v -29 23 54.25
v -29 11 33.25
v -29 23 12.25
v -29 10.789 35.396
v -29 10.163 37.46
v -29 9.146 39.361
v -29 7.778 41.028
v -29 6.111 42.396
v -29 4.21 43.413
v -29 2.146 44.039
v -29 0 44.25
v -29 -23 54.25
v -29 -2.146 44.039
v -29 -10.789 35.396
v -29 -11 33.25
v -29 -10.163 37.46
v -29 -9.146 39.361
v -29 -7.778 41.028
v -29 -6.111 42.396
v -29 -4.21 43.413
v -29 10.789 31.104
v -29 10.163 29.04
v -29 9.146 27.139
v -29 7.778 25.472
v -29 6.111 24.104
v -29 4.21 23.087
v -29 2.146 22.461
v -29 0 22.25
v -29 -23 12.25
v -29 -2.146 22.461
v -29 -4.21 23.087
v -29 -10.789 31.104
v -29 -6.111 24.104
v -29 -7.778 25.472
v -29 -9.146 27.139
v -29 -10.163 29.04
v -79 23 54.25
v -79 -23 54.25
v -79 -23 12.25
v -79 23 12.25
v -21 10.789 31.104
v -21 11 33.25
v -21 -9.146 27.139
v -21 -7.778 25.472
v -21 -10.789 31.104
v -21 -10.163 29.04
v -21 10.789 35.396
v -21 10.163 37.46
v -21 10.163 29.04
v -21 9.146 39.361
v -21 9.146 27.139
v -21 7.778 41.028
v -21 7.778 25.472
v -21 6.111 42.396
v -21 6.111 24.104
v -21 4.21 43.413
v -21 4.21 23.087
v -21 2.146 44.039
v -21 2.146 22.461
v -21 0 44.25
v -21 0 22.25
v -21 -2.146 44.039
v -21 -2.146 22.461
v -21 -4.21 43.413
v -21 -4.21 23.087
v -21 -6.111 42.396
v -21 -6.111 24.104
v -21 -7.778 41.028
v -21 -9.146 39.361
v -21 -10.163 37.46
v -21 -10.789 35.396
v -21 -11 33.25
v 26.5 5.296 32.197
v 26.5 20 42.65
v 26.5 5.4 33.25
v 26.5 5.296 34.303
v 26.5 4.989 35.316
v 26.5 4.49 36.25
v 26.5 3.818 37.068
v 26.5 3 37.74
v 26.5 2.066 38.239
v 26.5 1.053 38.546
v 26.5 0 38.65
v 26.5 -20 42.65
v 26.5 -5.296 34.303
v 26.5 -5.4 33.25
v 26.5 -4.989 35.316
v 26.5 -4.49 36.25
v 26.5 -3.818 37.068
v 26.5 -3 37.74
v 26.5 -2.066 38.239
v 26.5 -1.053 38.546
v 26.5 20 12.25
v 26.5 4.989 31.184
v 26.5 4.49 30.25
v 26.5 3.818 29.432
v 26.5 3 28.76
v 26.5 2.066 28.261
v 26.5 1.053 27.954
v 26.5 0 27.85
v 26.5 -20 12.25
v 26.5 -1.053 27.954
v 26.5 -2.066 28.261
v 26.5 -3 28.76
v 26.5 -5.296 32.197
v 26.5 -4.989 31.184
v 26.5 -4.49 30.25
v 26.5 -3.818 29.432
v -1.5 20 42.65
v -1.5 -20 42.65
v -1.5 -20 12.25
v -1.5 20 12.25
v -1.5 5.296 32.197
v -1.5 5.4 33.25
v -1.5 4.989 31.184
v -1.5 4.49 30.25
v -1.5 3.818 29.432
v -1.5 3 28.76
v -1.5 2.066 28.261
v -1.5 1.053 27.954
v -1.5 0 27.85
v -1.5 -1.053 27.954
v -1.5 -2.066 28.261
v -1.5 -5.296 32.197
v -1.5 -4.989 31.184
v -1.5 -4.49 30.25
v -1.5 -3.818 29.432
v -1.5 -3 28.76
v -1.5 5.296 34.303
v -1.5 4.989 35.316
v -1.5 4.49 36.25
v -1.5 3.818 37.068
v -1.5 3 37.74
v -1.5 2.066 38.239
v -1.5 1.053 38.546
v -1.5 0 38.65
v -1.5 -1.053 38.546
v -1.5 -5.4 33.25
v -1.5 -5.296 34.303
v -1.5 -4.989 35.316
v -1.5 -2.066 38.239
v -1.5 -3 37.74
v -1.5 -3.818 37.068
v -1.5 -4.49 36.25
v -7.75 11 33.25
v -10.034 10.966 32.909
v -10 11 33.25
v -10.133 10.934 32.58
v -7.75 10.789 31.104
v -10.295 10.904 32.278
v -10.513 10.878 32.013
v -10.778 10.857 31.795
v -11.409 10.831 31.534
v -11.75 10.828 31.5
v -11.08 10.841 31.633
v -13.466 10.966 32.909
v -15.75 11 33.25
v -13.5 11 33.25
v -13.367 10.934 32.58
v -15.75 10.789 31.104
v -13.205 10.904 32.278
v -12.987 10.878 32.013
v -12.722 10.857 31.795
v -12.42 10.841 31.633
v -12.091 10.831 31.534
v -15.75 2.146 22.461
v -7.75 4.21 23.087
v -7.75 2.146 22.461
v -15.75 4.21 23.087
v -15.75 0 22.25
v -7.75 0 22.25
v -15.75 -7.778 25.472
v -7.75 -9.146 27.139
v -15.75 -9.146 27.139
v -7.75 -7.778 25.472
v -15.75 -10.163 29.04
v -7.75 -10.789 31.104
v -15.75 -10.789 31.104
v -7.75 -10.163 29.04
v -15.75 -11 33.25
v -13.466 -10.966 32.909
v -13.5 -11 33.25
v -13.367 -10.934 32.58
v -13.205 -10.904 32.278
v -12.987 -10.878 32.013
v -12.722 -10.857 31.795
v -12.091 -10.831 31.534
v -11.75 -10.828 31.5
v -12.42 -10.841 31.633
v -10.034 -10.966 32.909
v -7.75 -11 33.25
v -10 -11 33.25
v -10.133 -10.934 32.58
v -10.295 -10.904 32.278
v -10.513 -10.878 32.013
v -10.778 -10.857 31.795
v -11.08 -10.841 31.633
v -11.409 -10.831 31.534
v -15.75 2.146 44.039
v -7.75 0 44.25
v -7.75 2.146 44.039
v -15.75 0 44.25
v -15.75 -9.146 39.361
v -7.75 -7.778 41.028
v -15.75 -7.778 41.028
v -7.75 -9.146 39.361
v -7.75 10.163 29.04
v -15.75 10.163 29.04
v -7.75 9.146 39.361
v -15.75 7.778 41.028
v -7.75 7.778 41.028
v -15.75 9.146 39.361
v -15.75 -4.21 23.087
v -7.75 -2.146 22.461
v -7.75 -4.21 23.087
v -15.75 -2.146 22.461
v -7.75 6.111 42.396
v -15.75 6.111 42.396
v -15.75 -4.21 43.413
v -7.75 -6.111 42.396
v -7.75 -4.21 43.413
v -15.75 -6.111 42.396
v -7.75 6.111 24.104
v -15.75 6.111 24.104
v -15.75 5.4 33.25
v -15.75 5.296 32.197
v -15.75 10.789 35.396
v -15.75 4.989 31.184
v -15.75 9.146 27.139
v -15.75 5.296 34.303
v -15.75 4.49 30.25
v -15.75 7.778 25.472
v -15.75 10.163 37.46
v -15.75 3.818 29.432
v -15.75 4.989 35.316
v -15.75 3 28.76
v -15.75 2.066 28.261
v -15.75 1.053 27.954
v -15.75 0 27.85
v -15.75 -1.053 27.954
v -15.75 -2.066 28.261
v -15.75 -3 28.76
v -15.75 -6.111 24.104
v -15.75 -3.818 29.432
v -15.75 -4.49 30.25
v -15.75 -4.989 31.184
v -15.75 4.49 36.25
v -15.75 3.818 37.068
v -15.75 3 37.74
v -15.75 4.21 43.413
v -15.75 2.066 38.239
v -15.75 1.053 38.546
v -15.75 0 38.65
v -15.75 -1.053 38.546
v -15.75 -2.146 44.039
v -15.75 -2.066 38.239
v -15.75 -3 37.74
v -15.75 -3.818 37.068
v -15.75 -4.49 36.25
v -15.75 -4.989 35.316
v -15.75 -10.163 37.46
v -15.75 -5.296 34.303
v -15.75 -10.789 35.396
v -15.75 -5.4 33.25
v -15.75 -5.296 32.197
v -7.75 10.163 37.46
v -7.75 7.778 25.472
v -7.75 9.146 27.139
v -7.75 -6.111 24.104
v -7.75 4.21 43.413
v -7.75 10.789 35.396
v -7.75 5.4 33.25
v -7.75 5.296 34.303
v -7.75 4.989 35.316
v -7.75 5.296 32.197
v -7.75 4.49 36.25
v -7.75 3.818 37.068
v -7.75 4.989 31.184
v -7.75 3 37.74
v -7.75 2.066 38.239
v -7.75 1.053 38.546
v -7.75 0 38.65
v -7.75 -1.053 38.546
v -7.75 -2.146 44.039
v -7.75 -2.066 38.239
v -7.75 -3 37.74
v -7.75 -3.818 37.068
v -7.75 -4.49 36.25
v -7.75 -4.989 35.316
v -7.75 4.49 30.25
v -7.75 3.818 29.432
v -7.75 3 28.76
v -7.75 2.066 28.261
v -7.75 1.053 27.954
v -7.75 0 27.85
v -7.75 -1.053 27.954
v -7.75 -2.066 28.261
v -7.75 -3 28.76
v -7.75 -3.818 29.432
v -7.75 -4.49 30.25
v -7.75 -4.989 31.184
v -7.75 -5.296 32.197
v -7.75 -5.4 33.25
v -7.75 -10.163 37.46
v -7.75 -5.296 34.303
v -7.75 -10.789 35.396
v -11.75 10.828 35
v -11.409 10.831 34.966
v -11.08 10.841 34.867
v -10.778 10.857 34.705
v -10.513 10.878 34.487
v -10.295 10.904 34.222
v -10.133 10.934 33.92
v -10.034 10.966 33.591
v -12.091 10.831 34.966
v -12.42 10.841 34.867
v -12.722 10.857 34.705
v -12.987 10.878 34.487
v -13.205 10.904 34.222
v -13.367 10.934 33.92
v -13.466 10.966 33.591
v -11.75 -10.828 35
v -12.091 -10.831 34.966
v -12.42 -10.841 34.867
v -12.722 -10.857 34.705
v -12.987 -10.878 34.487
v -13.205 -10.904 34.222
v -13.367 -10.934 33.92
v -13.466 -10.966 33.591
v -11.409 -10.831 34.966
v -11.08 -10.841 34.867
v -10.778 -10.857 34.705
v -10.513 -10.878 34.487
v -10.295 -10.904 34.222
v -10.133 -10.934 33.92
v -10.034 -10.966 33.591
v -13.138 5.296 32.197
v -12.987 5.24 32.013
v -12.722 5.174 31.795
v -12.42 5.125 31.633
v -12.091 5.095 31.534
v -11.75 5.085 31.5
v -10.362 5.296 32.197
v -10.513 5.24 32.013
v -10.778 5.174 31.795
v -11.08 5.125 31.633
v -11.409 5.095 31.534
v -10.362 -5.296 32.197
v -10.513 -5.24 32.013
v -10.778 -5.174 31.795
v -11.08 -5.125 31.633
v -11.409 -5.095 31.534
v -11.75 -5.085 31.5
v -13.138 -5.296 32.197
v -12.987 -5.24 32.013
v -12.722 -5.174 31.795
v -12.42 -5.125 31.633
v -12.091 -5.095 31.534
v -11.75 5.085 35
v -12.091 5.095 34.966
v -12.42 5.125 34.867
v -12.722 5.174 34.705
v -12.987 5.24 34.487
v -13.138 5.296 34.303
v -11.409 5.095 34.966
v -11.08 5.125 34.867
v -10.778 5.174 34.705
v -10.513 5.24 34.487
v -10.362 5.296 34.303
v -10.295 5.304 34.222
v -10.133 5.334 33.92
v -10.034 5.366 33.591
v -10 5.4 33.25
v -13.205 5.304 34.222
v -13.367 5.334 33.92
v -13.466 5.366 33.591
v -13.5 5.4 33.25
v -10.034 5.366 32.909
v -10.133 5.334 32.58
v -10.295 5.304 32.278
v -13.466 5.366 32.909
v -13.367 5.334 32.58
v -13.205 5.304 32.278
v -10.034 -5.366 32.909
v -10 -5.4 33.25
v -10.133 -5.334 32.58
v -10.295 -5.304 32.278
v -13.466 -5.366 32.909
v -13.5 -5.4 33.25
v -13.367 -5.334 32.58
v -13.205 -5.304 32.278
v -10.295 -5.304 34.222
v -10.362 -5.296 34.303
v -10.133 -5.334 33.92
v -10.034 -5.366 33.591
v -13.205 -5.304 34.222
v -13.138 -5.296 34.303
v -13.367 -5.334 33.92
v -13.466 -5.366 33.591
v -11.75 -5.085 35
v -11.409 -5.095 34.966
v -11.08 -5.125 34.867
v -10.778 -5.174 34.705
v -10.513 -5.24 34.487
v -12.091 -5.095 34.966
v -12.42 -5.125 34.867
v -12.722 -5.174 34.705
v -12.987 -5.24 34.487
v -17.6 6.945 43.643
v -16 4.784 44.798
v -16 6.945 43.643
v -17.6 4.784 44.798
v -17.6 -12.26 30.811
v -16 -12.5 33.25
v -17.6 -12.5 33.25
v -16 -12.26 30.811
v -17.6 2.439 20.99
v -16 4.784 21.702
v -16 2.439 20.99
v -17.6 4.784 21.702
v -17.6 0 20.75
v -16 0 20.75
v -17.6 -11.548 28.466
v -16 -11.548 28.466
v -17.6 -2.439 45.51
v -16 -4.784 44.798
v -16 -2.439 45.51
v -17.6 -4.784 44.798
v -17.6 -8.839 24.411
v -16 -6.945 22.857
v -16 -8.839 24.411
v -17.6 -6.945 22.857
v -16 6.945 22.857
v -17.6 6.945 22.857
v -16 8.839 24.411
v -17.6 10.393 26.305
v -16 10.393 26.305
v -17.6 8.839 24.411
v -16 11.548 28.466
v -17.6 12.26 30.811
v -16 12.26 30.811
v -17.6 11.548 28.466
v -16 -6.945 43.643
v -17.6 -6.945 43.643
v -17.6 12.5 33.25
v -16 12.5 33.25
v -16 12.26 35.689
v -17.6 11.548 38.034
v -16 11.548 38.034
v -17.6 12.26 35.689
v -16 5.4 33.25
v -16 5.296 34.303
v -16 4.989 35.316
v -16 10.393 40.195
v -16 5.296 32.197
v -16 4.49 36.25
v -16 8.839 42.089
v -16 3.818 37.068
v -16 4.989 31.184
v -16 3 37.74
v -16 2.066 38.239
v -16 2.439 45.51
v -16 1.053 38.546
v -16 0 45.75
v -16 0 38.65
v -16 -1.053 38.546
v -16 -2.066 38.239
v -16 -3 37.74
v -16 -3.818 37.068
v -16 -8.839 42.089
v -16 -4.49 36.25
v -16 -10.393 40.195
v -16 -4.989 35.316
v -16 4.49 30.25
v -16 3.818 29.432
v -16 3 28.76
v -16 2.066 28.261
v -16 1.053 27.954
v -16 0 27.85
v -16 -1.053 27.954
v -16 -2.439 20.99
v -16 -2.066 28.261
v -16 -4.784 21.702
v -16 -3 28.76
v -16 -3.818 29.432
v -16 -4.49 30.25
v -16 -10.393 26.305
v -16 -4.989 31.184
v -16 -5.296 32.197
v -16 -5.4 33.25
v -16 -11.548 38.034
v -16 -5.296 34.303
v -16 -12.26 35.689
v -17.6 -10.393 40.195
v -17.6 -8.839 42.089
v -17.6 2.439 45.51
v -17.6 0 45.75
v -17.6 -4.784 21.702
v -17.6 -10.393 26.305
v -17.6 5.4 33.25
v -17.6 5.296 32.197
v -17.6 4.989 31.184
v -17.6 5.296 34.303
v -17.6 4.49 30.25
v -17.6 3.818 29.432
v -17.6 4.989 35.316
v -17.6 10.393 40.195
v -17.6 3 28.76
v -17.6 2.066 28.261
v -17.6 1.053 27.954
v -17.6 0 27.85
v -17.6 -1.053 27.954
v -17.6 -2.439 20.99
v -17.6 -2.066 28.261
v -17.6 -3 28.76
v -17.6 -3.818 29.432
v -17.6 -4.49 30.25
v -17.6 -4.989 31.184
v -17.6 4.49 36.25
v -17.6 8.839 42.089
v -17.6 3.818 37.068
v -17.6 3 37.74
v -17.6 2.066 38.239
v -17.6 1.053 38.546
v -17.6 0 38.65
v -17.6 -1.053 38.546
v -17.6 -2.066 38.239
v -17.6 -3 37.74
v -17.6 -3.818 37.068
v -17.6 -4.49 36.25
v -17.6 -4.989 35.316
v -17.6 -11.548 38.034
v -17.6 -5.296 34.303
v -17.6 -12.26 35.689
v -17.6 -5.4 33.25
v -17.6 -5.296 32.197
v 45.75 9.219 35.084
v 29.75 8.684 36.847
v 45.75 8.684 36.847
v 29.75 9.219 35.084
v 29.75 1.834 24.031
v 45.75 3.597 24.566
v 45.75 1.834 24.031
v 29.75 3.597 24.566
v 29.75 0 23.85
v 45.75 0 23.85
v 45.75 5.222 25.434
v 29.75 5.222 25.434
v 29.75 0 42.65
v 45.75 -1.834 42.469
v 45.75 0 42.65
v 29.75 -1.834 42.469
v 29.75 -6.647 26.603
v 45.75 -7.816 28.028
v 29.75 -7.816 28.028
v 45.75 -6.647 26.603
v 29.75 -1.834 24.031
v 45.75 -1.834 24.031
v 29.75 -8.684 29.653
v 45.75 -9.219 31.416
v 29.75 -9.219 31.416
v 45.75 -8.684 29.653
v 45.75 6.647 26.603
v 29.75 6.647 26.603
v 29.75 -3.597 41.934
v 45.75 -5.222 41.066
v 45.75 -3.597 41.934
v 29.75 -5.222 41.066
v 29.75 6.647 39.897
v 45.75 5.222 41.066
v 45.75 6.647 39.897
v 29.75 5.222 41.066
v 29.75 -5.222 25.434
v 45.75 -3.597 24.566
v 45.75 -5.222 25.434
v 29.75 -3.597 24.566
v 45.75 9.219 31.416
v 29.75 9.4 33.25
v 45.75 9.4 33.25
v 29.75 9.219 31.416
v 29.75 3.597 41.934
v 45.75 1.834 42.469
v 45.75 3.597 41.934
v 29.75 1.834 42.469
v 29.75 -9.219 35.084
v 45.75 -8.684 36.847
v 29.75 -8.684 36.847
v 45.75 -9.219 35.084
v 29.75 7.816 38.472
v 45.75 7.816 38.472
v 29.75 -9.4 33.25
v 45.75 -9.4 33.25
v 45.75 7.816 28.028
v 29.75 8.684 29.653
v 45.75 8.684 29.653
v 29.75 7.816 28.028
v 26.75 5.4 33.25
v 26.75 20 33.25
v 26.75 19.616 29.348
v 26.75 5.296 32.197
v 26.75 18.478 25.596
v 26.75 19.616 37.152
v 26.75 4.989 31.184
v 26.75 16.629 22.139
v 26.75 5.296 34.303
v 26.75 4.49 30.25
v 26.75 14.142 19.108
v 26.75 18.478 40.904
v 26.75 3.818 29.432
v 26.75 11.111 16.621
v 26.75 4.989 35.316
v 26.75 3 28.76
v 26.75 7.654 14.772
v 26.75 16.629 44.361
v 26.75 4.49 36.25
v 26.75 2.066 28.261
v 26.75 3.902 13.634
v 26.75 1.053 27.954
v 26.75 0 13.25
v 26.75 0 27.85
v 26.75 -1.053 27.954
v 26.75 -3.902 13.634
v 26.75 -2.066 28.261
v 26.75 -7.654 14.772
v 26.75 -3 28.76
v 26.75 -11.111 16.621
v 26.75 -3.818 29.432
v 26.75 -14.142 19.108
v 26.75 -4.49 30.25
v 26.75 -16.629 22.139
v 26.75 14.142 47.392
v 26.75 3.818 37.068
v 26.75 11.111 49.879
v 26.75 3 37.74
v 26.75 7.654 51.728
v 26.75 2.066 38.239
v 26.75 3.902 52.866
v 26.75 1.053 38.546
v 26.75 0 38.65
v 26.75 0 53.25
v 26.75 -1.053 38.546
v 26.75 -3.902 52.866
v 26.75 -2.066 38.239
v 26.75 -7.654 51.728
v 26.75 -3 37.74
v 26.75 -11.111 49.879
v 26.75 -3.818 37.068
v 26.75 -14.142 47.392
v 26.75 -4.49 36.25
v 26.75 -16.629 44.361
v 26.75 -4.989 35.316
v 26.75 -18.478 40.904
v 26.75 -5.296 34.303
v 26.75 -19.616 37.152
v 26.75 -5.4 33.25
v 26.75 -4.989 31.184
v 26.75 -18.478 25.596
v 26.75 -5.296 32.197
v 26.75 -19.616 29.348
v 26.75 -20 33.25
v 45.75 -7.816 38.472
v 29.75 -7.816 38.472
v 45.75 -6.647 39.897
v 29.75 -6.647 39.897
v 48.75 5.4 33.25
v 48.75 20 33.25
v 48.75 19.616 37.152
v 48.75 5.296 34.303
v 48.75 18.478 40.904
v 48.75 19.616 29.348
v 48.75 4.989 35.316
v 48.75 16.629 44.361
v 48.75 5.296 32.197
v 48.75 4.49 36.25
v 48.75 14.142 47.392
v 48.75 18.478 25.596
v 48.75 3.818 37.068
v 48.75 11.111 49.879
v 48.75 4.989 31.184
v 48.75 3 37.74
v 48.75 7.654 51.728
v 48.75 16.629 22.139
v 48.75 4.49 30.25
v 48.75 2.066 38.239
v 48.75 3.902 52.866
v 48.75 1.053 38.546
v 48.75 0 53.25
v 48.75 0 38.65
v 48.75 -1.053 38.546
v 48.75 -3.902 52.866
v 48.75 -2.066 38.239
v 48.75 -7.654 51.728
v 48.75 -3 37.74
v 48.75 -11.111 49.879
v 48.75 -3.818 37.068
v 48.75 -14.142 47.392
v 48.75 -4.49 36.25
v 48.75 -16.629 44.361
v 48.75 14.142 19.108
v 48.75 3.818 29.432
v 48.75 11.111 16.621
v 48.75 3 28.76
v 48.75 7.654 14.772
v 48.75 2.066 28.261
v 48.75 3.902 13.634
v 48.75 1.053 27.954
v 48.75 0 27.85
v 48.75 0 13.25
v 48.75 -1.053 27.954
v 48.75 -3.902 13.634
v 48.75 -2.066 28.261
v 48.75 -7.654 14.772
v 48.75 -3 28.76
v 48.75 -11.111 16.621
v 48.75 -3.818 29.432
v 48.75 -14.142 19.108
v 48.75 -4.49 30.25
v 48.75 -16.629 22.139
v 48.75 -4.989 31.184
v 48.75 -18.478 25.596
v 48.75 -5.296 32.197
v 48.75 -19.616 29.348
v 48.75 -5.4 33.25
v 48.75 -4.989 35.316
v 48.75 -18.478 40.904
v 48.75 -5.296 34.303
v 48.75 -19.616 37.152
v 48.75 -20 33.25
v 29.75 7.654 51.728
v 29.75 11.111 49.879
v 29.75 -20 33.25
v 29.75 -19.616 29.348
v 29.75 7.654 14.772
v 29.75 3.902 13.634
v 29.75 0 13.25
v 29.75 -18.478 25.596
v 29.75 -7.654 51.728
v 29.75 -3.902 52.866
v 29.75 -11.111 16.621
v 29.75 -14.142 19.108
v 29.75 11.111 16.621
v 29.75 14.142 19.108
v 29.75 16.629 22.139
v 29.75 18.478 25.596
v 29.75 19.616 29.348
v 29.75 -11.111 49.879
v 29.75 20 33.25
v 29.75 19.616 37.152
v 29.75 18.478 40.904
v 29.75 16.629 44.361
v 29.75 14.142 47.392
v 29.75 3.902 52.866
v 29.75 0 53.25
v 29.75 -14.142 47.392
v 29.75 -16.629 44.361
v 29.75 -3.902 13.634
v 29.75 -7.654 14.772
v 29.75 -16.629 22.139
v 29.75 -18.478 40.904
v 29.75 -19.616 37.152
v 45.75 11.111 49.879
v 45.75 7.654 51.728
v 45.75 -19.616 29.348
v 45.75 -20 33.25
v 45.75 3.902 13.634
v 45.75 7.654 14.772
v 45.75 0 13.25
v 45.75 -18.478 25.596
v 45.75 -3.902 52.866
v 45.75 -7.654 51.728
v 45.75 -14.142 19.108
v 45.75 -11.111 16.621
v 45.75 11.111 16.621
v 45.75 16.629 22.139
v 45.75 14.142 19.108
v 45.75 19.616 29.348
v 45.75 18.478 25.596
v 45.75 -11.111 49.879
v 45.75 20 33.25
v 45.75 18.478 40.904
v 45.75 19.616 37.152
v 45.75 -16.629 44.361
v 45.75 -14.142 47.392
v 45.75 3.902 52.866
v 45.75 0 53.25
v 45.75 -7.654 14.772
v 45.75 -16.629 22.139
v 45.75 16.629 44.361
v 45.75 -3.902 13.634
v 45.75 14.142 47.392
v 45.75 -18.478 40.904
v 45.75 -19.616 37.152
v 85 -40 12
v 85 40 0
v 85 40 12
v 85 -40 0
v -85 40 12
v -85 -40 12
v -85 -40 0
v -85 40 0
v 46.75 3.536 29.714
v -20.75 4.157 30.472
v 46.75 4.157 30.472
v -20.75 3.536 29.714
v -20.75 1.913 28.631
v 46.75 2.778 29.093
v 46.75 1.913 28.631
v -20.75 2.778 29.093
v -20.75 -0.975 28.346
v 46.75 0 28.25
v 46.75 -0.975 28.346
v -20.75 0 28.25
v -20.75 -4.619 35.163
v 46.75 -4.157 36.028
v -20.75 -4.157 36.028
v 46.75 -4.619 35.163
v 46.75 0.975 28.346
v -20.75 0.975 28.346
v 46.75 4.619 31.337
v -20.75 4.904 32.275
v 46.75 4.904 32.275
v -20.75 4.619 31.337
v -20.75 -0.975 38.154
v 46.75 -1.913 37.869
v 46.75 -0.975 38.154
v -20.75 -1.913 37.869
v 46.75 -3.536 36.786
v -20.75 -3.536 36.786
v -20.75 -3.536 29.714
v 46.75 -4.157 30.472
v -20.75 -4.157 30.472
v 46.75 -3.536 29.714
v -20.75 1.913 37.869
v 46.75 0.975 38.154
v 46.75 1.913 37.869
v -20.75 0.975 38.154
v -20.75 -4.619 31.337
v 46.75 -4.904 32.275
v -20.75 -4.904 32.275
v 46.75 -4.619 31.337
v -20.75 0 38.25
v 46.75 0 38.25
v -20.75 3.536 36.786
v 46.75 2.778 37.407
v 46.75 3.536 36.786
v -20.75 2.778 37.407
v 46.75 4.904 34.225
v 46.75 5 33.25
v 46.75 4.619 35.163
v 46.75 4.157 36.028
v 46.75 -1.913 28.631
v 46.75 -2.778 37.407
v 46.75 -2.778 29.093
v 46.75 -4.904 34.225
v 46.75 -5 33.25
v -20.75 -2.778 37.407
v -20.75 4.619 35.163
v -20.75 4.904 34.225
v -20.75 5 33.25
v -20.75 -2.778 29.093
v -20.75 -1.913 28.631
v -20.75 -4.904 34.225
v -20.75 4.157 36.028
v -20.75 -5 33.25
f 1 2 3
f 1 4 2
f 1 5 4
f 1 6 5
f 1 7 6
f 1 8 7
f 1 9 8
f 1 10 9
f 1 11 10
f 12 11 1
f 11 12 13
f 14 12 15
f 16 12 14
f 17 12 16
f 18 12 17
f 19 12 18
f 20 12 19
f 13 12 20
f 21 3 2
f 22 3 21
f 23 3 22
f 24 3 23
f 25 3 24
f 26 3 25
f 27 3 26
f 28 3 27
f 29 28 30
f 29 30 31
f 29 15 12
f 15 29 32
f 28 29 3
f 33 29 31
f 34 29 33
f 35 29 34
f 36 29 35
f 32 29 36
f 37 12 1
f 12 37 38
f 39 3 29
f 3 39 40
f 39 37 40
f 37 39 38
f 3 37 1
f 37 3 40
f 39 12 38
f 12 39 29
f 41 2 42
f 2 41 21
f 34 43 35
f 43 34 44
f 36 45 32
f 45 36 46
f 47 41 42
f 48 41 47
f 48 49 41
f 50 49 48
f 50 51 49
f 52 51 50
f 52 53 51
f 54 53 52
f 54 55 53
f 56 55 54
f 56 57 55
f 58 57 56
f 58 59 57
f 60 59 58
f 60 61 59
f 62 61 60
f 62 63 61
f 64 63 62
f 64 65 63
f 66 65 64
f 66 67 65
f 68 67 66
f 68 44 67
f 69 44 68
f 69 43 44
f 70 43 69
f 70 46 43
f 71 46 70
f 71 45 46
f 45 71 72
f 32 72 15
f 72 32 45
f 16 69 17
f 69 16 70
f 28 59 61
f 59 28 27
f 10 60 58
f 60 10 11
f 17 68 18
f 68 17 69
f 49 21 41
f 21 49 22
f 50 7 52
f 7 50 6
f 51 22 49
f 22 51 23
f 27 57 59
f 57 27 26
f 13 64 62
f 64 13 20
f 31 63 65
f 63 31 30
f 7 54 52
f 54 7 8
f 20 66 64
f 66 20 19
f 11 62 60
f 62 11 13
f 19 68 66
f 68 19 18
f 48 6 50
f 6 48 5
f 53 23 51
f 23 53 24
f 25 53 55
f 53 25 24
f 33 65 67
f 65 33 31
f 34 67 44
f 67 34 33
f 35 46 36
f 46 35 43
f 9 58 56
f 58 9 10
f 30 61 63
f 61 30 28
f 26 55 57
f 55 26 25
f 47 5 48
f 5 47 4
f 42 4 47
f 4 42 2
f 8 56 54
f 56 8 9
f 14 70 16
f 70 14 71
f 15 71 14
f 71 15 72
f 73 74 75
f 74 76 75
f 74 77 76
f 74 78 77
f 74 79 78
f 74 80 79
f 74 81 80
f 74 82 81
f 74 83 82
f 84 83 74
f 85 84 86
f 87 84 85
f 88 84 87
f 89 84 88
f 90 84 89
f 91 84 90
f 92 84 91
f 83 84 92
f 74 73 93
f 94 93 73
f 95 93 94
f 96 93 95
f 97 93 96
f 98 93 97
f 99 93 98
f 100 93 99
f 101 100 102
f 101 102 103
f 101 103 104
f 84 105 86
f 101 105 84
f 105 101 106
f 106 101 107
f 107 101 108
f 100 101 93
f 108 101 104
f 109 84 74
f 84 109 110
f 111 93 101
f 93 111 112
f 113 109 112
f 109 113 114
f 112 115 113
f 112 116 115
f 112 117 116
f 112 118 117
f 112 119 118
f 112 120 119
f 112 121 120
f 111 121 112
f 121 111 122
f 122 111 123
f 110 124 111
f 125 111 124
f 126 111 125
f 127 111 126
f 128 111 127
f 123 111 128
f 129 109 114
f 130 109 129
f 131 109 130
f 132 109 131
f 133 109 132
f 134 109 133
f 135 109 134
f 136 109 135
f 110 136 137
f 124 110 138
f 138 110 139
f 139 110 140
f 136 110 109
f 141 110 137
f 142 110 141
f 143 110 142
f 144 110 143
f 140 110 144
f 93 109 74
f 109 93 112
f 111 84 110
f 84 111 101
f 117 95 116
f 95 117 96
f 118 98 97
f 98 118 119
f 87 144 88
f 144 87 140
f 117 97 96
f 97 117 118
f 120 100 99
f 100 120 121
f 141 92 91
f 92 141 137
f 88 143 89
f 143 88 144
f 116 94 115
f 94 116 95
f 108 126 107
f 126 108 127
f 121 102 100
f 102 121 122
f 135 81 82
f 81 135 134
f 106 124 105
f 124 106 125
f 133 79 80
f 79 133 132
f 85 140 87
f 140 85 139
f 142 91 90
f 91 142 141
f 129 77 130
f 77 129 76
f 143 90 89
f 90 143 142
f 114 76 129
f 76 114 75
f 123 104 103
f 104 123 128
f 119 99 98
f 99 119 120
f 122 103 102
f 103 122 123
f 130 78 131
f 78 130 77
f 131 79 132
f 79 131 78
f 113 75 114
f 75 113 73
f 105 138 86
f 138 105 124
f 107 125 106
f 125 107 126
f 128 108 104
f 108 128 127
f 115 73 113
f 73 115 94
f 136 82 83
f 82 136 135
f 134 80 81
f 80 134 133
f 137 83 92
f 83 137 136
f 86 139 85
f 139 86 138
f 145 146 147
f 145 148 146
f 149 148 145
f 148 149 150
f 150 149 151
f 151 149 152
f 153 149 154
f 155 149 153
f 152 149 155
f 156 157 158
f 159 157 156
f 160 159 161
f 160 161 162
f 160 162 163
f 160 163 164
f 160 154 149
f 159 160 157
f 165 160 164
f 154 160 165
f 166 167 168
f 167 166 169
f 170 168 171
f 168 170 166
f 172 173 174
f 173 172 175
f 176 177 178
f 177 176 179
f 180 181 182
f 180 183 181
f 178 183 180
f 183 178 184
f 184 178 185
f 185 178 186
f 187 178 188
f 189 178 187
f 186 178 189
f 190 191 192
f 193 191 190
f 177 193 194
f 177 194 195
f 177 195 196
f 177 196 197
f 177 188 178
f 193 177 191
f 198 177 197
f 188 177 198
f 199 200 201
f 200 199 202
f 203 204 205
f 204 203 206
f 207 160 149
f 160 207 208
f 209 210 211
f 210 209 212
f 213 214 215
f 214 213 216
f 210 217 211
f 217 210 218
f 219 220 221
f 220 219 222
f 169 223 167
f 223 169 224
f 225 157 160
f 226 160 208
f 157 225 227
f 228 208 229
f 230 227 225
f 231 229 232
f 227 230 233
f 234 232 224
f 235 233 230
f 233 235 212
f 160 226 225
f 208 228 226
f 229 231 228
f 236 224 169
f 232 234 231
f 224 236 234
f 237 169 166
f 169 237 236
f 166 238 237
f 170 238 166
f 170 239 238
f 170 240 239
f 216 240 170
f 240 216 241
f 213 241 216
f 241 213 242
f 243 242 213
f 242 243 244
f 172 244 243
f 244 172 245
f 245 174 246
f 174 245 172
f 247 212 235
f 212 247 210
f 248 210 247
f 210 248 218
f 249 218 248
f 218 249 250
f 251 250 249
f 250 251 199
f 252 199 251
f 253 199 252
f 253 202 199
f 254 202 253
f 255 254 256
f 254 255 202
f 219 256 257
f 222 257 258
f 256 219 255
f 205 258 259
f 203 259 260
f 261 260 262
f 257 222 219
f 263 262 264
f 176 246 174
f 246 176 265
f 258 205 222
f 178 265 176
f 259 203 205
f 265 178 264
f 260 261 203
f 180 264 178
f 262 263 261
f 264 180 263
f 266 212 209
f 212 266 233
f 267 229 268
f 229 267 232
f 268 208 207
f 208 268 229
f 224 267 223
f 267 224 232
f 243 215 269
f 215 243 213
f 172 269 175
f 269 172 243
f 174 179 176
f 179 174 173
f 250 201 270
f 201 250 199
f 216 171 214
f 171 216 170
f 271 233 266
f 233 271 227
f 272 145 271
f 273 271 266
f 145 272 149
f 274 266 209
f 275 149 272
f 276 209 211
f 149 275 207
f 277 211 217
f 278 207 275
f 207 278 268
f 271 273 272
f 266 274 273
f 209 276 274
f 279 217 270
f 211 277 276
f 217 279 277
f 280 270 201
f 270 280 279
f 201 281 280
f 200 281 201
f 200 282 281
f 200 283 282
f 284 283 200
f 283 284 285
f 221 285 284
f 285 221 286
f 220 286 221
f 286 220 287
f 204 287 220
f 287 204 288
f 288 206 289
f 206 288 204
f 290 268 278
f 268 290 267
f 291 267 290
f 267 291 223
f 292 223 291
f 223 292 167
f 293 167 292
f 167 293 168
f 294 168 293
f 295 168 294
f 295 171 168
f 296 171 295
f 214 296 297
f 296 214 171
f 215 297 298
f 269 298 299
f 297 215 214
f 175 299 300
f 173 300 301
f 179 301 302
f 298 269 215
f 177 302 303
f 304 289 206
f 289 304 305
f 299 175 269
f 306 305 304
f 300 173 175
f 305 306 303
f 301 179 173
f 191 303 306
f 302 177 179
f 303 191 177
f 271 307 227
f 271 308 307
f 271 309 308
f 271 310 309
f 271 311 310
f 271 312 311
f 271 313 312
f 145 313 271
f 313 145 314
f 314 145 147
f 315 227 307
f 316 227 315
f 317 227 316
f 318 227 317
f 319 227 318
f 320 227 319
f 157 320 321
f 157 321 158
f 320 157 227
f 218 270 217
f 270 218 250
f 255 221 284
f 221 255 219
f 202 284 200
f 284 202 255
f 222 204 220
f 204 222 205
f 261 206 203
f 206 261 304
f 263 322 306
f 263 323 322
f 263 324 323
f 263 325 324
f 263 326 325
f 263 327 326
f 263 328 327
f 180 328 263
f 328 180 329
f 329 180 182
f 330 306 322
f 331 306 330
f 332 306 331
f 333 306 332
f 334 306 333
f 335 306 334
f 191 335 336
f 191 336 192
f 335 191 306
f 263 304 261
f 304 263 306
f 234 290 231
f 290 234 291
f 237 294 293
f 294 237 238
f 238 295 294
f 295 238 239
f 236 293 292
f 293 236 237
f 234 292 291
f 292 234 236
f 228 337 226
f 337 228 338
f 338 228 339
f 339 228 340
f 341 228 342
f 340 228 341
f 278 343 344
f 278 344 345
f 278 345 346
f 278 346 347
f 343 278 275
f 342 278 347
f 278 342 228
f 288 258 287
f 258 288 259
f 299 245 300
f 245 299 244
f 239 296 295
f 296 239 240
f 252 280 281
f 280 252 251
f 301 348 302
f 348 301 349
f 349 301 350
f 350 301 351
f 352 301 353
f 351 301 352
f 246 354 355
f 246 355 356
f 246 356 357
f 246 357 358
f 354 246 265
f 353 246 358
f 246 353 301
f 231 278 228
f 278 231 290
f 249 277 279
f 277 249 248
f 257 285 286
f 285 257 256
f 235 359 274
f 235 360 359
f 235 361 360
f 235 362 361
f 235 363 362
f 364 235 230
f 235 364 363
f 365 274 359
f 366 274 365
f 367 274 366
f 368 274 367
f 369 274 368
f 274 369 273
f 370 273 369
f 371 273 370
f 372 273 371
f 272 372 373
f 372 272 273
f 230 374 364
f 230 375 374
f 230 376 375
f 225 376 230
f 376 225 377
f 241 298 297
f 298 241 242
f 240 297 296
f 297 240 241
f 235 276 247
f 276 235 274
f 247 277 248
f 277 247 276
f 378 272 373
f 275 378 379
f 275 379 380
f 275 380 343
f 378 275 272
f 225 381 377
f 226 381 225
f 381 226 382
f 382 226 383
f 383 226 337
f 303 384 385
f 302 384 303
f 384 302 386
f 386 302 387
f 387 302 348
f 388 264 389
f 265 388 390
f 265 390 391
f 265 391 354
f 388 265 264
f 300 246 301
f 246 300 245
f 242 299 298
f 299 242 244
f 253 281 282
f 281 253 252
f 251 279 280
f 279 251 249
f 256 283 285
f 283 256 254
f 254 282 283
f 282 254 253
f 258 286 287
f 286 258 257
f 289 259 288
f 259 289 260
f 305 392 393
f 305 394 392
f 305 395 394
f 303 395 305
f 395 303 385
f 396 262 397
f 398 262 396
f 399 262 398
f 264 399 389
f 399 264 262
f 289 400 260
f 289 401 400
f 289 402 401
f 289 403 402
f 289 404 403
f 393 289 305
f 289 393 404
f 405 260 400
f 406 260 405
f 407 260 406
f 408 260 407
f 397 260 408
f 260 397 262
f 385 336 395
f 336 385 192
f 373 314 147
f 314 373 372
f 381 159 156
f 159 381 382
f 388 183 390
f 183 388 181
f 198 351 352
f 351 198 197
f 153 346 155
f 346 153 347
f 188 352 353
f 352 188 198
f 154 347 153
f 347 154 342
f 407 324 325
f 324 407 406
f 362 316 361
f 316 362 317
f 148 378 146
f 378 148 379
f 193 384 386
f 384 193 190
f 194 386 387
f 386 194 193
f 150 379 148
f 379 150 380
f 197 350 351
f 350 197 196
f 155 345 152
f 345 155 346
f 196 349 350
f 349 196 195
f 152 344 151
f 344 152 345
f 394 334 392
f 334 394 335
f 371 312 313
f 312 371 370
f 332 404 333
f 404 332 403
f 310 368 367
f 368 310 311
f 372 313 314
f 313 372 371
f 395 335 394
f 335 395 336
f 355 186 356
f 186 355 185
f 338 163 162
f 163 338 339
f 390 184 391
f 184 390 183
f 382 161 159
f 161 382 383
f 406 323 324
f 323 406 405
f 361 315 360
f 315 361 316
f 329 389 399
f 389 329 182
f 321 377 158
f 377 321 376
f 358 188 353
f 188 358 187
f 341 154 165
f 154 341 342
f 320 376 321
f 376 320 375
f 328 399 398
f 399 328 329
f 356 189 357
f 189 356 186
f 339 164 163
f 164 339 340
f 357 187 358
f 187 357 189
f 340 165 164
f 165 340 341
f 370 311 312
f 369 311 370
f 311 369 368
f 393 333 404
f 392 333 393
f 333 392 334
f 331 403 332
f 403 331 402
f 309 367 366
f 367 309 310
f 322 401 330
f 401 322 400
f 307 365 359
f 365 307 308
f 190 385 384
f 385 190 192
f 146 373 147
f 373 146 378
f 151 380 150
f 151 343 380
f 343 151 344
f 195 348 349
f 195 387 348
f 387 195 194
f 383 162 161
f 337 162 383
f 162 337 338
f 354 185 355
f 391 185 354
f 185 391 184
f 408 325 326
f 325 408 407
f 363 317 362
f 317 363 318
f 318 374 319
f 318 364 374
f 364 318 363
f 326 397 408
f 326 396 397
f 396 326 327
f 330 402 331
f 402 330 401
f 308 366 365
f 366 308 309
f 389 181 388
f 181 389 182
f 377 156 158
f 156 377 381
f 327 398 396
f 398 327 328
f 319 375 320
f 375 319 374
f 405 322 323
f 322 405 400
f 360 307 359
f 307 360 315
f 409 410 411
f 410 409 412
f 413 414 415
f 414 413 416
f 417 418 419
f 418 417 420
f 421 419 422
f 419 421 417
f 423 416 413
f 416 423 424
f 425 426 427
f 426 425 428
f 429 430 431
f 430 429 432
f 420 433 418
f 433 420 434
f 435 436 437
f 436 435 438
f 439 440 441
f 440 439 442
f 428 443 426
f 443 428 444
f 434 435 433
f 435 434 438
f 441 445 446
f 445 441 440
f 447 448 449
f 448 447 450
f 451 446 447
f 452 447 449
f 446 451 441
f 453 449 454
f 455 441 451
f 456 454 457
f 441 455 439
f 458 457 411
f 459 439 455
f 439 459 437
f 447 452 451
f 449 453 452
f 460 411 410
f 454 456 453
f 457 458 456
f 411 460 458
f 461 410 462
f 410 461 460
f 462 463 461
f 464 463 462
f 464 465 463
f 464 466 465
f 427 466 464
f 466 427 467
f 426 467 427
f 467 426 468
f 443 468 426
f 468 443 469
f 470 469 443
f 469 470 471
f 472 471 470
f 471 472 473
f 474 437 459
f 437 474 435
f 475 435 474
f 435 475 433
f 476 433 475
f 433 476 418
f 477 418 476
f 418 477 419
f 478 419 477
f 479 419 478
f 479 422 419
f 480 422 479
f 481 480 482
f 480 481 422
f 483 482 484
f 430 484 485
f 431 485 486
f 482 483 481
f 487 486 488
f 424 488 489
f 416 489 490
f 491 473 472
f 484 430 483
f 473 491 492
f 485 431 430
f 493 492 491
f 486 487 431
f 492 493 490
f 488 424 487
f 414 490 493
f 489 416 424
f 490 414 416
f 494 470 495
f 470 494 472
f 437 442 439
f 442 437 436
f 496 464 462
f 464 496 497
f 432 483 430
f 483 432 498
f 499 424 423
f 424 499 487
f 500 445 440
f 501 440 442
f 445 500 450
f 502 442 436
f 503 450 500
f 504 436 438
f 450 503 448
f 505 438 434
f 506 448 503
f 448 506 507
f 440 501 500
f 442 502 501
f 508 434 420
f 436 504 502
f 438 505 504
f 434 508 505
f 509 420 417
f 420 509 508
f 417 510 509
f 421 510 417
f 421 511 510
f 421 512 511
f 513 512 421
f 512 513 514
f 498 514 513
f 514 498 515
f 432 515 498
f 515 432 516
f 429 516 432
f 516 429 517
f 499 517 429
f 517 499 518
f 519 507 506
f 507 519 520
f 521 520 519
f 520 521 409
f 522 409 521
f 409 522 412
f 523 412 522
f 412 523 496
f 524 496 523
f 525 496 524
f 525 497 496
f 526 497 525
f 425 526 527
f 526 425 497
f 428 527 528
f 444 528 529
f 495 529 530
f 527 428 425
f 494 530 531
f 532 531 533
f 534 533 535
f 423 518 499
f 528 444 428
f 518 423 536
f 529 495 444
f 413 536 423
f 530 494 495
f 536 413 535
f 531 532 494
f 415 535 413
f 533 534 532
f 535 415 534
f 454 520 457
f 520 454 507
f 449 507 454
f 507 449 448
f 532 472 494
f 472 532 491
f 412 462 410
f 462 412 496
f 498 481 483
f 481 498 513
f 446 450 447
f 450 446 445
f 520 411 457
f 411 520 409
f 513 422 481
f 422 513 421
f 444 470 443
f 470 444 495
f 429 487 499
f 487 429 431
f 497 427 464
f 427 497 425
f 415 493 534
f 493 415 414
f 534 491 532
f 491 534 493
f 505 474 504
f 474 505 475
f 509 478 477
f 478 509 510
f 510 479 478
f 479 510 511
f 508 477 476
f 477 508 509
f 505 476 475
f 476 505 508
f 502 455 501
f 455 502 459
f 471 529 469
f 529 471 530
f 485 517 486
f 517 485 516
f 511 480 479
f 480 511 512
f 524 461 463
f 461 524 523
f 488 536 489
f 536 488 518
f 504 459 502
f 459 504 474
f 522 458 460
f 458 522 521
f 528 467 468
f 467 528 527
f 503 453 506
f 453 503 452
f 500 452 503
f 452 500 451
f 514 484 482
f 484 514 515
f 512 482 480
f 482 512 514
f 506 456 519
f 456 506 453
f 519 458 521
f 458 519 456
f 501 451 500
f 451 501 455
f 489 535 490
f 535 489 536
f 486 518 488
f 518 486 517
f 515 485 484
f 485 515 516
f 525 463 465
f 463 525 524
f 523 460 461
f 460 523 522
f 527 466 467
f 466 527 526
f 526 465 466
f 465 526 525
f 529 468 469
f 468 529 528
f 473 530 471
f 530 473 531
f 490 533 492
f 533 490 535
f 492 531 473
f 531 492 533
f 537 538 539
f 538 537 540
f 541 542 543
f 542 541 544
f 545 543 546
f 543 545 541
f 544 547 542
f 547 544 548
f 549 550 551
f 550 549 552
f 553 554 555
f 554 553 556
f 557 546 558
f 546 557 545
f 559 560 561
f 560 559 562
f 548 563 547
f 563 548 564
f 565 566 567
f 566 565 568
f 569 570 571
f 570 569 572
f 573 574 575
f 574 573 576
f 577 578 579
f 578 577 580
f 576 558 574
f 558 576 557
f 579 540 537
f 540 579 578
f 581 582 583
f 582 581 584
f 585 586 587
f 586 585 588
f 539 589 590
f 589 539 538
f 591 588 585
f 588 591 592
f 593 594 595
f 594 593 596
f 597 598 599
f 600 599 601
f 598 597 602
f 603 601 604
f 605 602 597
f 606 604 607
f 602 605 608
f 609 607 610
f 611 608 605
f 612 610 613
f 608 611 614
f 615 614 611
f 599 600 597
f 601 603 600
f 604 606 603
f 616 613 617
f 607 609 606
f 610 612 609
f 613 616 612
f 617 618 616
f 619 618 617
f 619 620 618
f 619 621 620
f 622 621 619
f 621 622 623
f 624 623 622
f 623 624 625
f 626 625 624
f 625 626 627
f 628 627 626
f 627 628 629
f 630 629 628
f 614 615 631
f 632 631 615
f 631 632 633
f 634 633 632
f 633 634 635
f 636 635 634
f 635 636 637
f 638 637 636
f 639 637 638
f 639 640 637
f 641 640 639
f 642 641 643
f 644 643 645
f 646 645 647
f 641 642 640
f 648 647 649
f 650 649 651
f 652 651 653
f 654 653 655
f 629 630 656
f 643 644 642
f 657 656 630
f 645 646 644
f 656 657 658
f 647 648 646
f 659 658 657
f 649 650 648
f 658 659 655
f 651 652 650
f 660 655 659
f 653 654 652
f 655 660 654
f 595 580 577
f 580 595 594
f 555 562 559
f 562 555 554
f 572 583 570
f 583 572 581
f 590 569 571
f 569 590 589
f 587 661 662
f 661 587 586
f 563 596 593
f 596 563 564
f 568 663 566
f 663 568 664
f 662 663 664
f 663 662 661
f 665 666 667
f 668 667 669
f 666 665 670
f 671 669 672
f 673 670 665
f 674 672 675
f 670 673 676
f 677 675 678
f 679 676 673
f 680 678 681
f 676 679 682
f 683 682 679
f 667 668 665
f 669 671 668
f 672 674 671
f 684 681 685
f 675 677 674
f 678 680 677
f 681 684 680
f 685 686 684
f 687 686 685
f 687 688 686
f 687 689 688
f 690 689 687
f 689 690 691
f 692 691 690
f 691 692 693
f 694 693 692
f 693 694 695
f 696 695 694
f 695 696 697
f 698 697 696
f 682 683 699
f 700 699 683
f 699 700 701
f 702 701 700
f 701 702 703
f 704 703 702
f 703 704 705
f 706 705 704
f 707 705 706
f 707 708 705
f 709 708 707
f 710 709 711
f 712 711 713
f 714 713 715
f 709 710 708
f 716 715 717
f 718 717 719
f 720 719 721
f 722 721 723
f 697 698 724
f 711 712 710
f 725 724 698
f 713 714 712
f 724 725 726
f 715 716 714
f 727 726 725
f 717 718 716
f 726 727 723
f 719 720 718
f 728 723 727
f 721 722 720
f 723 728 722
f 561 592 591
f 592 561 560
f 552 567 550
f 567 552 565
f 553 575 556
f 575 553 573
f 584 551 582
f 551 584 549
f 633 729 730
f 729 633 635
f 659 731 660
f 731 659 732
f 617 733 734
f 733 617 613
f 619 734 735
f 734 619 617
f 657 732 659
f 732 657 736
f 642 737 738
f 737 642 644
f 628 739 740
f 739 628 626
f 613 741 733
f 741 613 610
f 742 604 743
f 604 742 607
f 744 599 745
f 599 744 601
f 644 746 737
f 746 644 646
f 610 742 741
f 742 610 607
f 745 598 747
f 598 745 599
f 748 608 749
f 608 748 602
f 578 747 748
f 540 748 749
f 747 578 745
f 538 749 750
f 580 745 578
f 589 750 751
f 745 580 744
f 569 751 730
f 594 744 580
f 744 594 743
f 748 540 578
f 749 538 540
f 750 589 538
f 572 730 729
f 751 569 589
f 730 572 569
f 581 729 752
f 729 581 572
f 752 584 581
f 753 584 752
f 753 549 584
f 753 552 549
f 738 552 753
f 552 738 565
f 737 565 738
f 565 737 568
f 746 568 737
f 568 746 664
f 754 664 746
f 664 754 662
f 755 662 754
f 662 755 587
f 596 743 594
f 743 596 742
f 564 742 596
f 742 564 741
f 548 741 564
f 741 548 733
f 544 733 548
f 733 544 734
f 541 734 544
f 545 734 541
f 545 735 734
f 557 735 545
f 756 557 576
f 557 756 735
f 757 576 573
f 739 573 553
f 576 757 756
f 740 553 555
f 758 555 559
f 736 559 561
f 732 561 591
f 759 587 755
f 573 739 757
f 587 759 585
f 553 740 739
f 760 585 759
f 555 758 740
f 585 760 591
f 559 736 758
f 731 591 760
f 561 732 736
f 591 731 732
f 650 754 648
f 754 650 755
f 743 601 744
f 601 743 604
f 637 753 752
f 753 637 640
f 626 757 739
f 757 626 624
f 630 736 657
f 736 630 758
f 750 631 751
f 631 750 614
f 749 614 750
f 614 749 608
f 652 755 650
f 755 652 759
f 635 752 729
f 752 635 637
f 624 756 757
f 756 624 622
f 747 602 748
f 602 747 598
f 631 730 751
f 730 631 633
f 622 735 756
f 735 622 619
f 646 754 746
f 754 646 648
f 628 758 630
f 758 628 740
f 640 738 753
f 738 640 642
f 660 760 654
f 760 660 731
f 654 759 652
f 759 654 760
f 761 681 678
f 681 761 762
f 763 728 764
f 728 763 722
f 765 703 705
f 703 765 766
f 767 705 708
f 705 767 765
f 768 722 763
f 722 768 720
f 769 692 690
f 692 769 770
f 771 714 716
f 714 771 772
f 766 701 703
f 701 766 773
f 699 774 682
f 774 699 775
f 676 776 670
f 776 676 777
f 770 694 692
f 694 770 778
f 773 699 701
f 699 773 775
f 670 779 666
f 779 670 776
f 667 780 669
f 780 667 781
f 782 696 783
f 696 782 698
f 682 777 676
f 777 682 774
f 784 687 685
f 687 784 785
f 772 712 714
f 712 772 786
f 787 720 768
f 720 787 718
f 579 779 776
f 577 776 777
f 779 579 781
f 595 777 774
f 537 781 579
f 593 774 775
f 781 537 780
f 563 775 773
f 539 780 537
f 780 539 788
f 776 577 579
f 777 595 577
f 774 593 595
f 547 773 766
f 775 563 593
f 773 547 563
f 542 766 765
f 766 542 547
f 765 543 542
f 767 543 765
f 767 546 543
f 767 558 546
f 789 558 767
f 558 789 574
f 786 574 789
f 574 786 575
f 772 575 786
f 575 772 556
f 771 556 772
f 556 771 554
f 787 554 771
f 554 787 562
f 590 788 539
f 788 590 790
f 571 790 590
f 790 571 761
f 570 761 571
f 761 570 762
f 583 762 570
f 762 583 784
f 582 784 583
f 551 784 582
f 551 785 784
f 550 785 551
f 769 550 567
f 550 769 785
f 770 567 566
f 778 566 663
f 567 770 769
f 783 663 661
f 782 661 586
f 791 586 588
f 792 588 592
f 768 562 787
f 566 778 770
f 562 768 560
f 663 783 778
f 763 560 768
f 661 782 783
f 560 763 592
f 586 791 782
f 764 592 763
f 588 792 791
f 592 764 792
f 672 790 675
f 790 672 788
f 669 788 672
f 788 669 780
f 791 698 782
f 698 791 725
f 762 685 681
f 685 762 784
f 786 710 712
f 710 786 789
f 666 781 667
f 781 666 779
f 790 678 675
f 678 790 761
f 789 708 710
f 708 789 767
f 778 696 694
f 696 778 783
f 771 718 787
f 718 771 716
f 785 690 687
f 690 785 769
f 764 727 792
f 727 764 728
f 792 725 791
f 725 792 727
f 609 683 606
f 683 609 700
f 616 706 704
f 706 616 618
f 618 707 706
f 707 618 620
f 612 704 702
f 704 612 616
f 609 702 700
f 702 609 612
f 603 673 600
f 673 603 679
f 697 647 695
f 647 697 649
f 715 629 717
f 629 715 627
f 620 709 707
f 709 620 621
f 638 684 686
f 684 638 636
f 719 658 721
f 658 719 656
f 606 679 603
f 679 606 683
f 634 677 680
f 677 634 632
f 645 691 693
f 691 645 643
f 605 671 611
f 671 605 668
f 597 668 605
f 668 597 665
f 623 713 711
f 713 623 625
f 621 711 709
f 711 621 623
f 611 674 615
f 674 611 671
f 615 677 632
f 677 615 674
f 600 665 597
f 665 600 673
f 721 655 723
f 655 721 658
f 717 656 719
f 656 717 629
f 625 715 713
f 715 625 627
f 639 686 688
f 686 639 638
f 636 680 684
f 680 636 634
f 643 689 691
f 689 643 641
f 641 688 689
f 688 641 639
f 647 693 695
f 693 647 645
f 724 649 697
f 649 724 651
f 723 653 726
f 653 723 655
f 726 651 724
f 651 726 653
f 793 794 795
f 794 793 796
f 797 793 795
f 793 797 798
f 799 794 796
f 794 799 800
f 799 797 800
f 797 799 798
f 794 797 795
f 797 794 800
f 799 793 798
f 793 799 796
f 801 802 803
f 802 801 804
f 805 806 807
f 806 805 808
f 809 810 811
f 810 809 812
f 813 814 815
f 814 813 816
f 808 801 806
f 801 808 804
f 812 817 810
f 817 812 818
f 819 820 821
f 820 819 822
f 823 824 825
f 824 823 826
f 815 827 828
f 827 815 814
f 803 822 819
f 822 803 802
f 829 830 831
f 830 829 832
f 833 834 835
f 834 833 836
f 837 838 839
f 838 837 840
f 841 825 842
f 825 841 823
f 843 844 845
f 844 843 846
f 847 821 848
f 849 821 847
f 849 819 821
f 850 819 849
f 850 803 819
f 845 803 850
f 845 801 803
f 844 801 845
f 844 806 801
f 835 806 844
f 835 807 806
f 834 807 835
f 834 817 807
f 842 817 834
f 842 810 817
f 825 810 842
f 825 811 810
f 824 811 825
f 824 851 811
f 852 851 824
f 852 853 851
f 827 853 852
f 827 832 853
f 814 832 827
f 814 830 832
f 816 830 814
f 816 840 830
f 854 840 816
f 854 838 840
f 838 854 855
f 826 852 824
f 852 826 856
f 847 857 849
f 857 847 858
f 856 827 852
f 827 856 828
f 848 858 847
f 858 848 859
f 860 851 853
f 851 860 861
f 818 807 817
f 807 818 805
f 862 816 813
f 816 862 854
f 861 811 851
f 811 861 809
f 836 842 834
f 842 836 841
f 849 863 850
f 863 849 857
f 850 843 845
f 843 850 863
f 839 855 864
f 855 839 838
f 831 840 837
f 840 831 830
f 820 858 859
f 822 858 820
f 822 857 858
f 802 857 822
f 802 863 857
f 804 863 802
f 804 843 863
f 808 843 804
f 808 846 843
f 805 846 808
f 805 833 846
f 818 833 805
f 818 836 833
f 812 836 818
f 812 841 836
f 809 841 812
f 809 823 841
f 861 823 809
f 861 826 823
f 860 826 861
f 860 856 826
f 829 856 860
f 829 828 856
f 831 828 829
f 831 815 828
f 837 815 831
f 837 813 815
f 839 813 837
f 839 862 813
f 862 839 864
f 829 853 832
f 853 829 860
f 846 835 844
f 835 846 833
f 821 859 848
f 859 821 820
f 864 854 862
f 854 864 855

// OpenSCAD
$fn = 32;

// ------------------------------------------------------------------------
// Motor drive station: motor 50 x 42 mm, shaft d10, pulley d40
// Every part is its own module, assembly() places every instance.
// ------------------------------------------------------------------------

// --- part 1 ---
module station_bed() {
  difference() {
    translate([-85, -40, 0]) cube([170, 80, 12]);
  }
}

// --- part 2 ---
module drive_motor() {
  union() {
    translate([-25, -23, 0]) cube([50, 46, 42]);
    translate([29, 0, 21]) rotate([0, 90, 0]) cylinder(h = 8, d = 22, center = true);
  }
}

// --- part 3 ---
module pillow_block() {
  difference() {
    translate([-14, -20, 0]) cube([28, 40, 30.4]);
    translate([0, 0, 21]) rotate([0, 90, 0]) cylinder(h = 30, d = 10.8, center = true);
  }
}

// --- part 4 ---
module drive_shaft() {
  translate([0, 0, -33.75]) cylinder(h = 67.5, d = 10);
}

// --- part 5 ---
module shaft_collar() {
  difference() {
    cylinder(h = 8, d = 22);
    translate([0, 0, -1]) cylinder(h = 10, d = 10.8);
    translate([0, 0, 4]) rotate([90, 0, 0]) cylinder(h = 24, d = 3.5, center = true);
  }
}

// --- part 6 ---
module collar_washer() {
  difference() {
      translate([0, 0, 0]) cylinder(h = 1.6, d = 25);
      translate([0, 0, -1]) cylinder(h = 3.6, d = 10.8);
    }
}

// --- part 7 ---
module drive_pulley() {
  difference() {
    union() {
      cylinder(h = 22, d = 18.8);
      cylinder(h = 3, d = 40);
      translate([0, 0, 19]) cylinder(h = 3, d = 40);
    }
    translate([0, 0, -1]) cylinder(h = 24, d = 10.8);
  }
}

// --- assembly ---
module assembly() {
  color([0.80, 0.24, 0.20]) translate([0, 0, 0]) rotate([0, 0, 0]) station_bed();
  color([0.20, 0.45, 0.75]) translate([-54, 0, 12.25]) rotate([0, 0, 0]) drive_motor();
  color([0.25, 0.62, 0.32]) translate([12.5, 0, 12.25]) rotate([0, 0, 0]) pillow_block();
  color([0.92, 0.70, 0.18]) translate([13, 0, 33.25]) rotate([0, 90, 0]) drive_shaft();
  color([0.58, 0.35, 0.70]) translate([-15.75, 0, 33.25]) rotate([0, 90, 0]) shaft_collar();
  color([0.16, 0.66, 0.66]) translate([-17.6, 0, 33.25]) rotate([0, 90, 0]) collar_washer();
  color([0.85, 0.48, 0.18]) translate([26.75, 0, 33.25]) rotate([0, 90, 0]) drive_pulley();
}

assembly();
